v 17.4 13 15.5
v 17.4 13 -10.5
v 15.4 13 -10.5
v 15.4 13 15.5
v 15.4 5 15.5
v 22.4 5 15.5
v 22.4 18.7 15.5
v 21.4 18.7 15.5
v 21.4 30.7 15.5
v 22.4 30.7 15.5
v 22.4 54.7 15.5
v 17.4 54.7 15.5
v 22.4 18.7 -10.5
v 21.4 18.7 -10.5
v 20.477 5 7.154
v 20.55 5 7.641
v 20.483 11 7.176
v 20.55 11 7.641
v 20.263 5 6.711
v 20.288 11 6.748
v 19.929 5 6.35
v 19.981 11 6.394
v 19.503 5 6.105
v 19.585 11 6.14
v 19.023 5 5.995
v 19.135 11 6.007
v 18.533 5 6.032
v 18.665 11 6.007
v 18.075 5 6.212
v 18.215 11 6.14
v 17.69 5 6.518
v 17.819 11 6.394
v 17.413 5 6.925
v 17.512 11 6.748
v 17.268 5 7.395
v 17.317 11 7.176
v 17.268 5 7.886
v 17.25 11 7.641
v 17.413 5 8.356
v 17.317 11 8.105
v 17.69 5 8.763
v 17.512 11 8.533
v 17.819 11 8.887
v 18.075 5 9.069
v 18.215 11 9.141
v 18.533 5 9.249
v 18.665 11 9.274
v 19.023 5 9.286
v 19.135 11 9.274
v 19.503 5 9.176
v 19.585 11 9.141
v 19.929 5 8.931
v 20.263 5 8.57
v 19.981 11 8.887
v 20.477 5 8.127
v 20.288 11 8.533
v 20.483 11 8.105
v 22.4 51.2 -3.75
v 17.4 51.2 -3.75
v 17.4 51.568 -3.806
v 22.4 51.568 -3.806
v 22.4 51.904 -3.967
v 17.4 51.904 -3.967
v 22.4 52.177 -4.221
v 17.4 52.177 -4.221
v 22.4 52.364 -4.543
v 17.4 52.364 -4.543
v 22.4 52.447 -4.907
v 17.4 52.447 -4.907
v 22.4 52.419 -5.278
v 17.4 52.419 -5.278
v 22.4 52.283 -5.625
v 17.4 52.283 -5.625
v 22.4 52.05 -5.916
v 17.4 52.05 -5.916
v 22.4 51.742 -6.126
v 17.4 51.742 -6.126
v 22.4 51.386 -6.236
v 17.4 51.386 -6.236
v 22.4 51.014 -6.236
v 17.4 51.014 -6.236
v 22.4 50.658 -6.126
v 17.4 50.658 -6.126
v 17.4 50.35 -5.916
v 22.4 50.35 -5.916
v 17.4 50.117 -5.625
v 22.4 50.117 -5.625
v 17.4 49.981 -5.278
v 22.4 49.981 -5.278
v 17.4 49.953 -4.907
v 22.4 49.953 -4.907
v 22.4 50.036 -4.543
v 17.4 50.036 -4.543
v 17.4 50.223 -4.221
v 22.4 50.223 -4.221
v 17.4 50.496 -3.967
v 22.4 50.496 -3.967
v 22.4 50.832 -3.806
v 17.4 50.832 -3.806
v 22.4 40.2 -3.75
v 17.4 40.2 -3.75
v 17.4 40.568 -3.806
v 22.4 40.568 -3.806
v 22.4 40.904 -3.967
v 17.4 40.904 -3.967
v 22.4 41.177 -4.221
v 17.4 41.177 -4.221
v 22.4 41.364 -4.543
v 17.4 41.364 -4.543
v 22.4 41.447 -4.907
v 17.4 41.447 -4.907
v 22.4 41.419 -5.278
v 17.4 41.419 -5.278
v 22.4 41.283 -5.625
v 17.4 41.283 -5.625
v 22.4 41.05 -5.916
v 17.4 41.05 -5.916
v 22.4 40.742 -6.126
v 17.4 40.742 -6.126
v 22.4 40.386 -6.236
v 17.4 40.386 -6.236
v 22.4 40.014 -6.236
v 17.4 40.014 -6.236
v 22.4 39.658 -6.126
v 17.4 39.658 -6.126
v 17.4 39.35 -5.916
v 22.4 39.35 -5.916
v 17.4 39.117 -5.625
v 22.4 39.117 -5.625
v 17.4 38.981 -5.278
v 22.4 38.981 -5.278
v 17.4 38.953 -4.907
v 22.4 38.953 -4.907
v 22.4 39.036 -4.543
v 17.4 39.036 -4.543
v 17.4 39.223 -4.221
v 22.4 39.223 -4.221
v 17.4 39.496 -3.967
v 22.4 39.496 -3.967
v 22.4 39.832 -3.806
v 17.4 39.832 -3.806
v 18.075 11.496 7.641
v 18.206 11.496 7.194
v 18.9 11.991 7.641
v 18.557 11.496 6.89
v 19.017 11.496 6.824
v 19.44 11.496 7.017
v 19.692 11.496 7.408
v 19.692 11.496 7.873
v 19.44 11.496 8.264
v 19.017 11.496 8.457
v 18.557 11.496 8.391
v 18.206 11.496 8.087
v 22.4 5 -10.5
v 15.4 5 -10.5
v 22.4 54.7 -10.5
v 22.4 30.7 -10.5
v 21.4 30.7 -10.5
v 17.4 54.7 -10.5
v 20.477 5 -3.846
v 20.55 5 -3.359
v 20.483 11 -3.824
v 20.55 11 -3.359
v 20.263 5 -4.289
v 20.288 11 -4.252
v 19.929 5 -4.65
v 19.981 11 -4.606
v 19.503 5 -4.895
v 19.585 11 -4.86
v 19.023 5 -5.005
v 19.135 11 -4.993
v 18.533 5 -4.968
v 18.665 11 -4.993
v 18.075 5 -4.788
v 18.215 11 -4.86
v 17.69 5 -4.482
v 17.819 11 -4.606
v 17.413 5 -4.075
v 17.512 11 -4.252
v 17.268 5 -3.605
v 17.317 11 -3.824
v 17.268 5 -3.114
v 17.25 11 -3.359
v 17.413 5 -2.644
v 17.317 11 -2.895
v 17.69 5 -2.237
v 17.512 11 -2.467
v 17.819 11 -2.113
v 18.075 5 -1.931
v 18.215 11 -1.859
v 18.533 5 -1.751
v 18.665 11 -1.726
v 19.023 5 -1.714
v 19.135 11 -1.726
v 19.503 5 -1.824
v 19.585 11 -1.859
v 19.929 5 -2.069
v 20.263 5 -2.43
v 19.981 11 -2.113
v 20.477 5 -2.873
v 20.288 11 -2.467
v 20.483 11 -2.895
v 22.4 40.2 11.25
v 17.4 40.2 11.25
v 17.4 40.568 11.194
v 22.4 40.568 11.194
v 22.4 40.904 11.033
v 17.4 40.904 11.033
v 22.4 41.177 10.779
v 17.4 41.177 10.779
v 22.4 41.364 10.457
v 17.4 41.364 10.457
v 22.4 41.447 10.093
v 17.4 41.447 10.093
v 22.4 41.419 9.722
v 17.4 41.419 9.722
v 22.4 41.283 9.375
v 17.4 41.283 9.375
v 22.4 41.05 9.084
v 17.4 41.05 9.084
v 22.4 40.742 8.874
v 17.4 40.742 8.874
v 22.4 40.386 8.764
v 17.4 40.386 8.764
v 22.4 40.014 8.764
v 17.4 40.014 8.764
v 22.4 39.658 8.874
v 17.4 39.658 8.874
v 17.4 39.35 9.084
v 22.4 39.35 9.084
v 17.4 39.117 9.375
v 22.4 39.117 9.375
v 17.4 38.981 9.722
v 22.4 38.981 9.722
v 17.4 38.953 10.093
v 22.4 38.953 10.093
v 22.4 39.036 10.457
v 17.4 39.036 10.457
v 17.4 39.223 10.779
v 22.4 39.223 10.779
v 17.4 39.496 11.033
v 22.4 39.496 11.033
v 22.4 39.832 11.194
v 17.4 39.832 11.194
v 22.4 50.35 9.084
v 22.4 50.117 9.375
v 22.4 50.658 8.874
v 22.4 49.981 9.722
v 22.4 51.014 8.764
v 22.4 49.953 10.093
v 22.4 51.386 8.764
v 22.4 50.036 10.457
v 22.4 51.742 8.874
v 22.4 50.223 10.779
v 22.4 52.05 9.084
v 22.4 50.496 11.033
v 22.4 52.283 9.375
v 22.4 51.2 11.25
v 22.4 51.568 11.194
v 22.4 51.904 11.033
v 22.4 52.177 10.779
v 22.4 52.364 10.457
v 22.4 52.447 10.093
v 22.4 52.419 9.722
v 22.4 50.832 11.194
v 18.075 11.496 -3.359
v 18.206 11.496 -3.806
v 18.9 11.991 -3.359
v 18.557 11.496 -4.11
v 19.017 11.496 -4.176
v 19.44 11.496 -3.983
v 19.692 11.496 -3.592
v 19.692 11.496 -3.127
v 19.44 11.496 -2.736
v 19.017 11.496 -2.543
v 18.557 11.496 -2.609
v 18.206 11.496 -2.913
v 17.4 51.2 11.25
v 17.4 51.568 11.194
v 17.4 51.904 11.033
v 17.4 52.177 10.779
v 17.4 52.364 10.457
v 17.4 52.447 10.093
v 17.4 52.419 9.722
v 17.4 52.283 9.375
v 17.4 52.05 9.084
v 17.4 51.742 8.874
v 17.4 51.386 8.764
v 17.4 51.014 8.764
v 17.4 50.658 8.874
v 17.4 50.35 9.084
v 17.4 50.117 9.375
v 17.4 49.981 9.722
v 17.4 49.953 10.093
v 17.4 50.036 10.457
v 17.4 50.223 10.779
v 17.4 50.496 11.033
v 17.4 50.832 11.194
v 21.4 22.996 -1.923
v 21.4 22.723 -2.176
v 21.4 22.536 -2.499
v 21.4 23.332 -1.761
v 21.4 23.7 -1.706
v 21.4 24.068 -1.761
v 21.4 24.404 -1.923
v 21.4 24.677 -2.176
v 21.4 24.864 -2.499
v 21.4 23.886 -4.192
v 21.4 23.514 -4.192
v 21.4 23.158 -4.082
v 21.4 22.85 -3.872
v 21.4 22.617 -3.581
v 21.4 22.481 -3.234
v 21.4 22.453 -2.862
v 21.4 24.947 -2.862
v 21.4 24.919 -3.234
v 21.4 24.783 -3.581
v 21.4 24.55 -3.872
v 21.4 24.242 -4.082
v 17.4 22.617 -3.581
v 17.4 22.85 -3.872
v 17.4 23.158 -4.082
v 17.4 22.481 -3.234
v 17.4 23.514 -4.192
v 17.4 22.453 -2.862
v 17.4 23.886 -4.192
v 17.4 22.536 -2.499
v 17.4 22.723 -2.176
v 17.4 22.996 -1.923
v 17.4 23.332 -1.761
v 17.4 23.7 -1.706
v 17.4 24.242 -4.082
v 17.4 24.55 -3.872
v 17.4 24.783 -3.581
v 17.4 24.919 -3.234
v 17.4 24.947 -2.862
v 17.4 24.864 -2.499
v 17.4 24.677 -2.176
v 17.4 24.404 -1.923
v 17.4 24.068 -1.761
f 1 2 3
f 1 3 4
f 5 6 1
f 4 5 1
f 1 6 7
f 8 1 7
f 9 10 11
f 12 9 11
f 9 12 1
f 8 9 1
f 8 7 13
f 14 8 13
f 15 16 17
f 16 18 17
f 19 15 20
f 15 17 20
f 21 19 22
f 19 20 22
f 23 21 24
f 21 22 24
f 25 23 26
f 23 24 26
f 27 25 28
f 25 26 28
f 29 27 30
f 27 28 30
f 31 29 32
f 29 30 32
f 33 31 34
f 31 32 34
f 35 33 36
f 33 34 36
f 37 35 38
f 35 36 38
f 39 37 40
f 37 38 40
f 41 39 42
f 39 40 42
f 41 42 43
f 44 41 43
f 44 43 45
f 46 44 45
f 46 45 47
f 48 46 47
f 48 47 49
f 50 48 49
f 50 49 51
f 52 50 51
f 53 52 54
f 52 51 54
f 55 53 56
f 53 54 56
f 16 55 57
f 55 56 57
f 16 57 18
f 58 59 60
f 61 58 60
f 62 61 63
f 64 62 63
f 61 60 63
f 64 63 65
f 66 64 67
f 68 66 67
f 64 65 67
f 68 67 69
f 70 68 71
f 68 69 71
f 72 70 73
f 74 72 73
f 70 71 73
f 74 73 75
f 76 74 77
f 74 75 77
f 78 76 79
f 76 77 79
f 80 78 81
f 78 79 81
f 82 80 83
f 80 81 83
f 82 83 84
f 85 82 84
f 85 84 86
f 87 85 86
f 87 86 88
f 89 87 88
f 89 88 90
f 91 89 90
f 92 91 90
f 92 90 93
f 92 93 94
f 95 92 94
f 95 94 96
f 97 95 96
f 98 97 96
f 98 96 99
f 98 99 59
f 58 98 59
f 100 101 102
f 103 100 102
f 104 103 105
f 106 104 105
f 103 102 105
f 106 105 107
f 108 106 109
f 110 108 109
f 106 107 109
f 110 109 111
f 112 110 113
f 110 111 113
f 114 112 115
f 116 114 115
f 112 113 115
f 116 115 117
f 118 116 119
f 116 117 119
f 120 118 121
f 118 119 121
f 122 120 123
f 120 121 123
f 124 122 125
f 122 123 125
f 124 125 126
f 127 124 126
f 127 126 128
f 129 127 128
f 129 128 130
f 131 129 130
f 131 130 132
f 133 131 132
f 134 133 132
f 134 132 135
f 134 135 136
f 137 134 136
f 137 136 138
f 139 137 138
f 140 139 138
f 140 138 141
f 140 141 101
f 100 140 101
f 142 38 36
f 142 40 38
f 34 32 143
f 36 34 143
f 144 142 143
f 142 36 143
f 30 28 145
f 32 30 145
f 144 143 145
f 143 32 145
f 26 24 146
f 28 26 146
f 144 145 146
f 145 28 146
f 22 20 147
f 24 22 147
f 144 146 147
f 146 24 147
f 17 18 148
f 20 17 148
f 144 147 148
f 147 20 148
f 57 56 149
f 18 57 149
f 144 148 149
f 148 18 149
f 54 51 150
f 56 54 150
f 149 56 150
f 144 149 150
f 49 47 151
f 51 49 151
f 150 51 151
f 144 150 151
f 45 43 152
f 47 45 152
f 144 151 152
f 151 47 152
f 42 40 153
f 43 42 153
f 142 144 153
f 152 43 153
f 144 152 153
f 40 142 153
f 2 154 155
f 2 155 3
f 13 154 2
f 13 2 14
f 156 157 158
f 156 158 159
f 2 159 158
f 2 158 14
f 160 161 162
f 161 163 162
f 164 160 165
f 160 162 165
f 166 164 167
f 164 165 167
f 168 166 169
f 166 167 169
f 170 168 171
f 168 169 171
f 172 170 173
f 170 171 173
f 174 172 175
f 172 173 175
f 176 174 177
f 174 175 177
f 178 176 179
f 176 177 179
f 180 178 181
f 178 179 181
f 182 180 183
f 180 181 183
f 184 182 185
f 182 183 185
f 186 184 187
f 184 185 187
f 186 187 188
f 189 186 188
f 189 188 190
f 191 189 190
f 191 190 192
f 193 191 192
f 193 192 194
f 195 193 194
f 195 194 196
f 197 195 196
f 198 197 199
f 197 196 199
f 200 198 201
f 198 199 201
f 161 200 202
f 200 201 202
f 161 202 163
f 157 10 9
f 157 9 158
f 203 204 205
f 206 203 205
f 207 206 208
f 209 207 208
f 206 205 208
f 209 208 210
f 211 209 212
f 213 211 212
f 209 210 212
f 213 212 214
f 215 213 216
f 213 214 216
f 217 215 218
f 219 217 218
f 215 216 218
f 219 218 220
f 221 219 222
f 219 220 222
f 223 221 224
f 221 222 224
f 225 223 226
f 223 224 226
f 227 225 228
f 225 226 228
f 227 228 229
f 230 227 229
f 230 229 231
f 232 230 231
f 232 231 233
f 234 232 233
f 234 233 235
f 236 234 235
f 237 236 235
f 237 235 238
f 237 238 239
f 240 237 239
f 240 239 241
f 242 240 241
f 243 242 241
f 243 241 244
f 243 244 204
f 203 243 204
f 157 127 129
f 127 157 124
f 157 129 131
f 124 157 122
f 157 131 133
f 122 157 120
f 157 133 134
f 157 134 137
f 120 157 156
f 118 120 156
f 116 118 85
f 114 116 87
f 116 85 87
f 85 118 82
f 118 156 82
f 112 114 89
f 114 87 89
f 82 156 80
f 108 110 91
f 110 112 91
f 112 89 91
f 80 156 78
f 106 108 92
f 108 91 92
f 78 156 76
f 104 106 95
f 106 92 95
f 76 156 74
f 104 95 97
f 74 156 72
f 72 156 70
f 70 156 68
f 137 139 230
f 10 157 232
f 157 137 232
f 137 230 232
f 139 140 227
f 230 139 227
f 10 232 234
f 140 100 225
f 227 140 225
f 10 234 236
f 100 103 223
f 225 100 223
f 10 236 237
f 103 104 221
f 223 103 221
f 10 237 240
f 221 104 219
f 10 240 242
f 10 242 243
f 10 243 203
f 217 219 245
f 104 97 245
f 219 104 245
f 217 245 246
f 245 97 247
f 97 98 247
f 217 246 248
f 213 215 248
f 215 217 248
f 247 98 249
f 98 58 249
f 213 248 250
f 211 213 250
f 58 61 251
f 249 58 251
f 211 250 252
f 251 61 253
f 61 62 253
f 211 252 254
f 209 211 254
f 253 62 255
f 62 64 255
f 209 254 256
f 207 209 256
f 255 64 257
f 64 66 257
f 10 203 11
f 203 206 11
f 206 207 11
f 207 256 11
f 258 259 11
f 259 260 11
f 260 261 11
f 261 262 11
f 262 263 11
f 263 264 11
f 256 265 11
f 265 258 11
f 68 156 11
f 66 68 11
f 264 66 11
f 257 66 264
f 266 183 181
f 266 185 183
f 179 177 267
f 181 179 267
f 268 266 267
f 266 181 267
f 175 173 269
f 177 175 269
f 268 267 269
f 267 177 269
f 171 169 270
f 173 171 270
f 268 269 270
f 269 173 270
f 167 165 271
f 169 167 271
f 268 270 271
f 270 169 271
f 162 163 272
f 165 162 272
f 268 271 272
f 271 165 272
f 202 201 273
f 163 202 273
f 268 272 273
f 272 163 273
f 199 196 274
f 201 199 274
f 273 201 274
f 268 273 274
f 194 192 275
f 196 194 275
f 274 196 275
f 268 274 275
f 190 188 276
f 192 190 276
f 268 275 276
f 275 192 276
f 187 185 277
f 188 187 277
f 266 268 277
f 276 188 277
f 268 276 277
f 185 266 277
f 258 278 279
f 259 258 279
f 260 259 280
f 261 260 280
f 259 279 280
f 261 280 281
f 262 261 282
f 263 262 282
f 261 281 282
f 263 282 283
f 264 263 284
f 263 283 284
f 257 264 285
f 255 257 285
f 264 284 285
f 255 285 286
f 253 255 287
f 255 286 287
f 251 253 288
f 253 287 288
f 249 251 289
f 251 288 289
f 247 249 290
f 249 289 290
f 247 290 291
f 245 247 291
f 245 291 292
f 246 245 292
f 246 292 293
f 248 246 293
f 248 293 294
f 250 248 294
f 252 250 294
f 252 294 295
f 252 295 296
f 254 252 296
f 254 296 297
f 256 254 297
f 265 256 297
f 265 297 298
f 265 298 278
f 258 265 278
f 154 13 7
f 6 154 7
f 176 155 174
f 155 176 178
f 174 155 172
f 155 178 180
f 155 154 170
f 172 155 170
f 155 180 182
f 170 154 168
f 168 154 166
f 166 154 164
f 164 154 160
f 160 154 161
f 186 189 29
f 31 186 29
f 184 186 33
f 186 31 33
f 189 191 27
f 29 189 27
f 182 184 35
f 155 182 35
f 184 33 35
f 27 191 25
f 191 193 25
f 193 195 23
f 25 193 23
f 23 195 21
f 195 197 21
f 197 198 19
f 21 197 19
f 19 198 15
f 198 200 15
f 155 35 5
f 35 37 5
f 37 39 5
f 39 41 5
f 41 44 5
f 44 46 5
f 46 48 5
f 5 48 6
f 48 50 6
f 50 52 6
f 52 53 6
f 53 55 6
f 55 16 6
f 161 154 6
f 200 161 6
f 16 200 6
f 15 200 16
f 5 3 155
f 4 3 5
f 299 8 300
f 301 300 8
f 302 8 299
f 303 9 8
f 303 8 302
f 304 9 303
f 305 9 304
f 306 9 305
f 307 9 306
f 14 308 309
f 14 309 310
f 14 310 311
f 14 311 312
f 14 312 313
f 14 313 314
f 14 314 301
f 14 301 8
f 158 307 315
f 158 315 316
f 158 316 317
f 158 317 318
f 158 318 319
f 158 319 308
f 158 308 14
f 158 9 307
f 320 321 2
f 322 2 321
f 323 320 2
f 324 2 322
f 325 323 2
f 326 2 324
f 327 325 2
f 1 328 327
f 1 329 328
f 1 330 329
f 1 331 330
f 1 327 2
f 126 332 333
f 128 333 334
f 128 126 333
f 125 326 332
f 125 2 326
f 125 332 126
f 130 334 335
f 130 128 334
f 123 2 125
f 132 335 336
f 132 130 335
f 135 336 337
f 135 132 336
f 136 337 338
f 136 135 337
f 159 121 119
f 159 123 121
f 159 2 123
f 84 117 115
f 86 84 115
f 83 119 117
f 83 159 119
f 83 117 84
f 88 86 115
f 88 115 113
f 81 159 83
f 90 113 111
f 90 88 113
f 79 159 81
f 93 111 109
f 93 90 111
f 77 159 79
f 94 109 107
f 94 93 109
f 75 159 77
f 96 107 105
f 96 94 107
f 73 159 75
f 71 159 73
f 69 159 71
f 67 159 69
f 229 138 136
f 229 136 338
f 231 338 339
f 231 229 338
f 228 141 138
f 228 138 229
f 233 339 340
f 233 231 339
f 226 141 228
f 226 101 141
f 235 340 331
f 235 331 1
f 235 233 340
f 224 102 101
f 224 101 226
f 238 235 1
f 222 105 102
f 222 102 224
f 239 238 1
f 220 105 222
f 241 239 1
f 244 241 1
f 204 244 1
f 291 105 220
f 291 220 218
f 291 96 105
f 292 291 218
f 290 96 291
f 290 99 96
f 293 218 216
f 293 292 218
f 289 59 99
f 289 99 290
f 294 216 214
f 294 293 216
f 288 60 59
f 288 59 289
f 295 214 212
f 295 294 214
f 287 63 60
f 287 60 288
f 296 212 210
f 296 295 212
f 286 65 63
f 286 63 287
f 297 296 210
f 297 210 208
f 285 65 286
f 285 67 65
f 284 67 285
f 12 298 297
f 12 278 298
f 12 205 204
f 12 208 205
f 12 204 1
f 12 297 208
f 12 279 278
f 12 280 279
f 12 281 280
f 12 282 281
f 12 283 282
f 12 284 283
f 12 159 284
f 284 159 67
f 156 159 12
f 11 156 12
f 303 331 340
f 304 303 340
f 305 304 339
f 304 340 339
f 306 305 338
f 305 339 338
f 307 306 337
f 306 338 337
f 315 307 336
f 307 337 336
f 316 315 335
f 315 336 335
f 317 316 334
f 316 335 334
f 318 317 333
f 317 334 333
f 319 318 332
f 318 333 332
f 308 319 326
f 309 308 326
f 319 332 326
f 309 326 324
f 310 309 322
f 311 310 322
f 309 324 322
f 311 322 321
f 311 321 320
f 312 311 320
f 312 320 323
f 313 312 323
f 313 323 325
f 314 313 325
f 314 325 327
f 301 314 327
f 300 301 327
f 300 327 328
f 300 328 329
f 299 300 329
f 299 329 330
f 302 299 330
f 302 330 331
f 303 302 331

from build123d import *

# Parameters (mm, degrees)
SKETCH_1_W             = 30
SKETCH_1_H             = 6
EXTRUDE_1_DEPTH        = 5
SKETCH_2_R             = 2.25
CUT_EXTRUDE_1_DEPTH    = 6
SKETCH_3_W             = 40
SKETCH_3_H             = 30
EXTRUDE_2_DEPTH        = 5
SKETCH_4_W             = 3
SKETCH_4_H             = 20
CUT_EXTRUDE_2_DEPTH    = 10
SKETCH_7_W             = 10
SKETCH_7_H             = 5
CUT_EXTRUDE_3_DEPTH    = 31
SKETCH_9_W             = 5
SKETCH_9_H             = 5
EXTRUDE_5_DEPTH        = 18
SKETCH_10_W            = 10
SKETCH_10_H            = 20
CUT_EXTRUDE_4_DEPTH    = 18
SKETCH_11_W            = 17
SKETCH_11_H            = 5
EXTRUDE_6_DEPTH        = 0.7
SKETCH_12_W            = 5
SKETCH_12_H            = 5
EXTRUDE_7_DEPTH        = 0.7
SKETCH_13_W            = 26
SKETCH_13_H            = 18
EXTRUDE_8_DEPTH        = 5
HOLE_WIZARD_M3_1_D     = 2.5
HOLE_WIZARD_M3_1_DEPTH = 7.5
HOLE_WIZARD_M3_1_TIP   = 0.751075774
SKETCH_16_W            = 14.26711197
SKETCH_16_H            = 39.299316136
CUT_EXTRUDE_5_DEPTH    = 31
SKETCH_17_W            = 5
SKETCH_17_H            = 26
EXTRUDE_9_DEPTH        = 30.7
SKETCH_18_W            = 5
SKETCH_18_H            = 26
EXTRUDE_10_DEPTH       = 1
SKETCH_20_W            = 26
SKETCH_20_H            = 8
EXTRUDE_11_DEPTH       = 2
HOLE_WIZARD_M4_1_D     = 3.3
HOLE_WIZARD_M4_1_DEPTH = 6
HOLE_WIZARD_M4_1_TIP   = 0.991420021
SKETCH_23_W            = 26
SKETCH_23_H            = 12
CUT_EXTRUDE_6_DEPTH    = 1
HOLE_WIZARD_M3_2_D     = 2.5
HOLE_WIZARD_M3_2_DEPTH = 7.5
HOLE_WIZARD_M3_2_TIP   = 0.751075774


with BuildPart() as part:
    # 草图1 → 凸台-拉伸1 (new body)
    with BuildSketch(Plane.XY):
        with Locations((15, 3)):
            Rectangle(SKETCH_1_W, SKETCH_1_H)
    extrude(amount=EXTRUDE_1_DEPTH)

    # 草图2 → 切除-拉伸1 (cut, through all)
    with BuildSketch(Plane.XY.offset(5)):
        with Locations((22.5, 3)):
            Circle(SKETCH_2_R)
        with Locations((7.5, 3)):
            Circle(SKETCH_2_R)
    extrude(amount=-CUT_EXTRUDE_1_DEPTH, mode=Mode.SUBTRACT)

    # 草图3 → 凸台-拉伸2 (add)
    with BuildSketch(Plane.XY.offset(5)):
        with Locations((10, 21)):
            Rectangle(SKETCH_3_W, SKETCH_3_H)
    extrude(amount=-EXTRUDE_2_DEPTH)

    # 草图4 → 切除-拉伸2 (cut)
    with BuildSketch(Plane.XY.offset(5)):
        with Locations((28.5, 26)):
            Rectangle(SKETCH_4_W, SKETCH_4_H)
    extrude(amount=-CUT_EXTRUDE_2_DEPTH, mode=Mode.SUBTRACT)

    # 草图7 → 切除-拉伸3 (cut, through all)
    with BuildSketch(Plane.XZ.offset(-6)):
        with Locations((-5, 2.5)):
            Rectangle(SKETCH_7_W, SKETCH_7_H)
    extrude(amount=-CUT_EXTRUDE_3_DEPTH, mode=Mode.SUBTRACT)

    # 草图9 → 凸台-拉伸5 (add)
    with BuildSketch(Plane(origin=(0, 36, 0), x_dir=(1, 0, 0), z_dir=(0, 1, 0))):
        with Locations((19.9, -2.5)):
            Rectangle(SKETCH_9_W, SKETCH_9_H)
    extrude(amount=EXTRUDE_5_DEPTH)

    # 草图10 → 切除-拉伸4 (cut)
    with BuildSketch(Plane.XY.offset(5)):
        with Locations((5, 26)):
            Rectangle(SKETCH_10_W, SKETCH_10_H)
    extrude(amount=-CUT_EXTRUDE_4_DEPTH, mode=Mode.SUBTRACT)

    # 草图11 → 凸台-拉伸6 (add)
    with BuildSketch(Plane(origin=(0, 36, 0), x_dir=(1, 0, 0), z_dir=(0, 1, 0))):
        with Locations((18.5, -2.5)):
            Rectangle(SKETCH_11_W, SKETCH_11_H)
    extrude(amount=EXTRUDE_6_DEPTH)

    # 草图12 → 凸台-拉伸7 (add)
    with BuildSketch(Plane(origin=(0, 54, 0), x_dir=(1, 0, 0), z_dir=(0, 1, 0))):
        with Locations((19.9, -2.5)):
            Rectangle(SKETCH_12_W, SKETCH_12_H)
    extrude(amount=EXTRUDE_7_DEPTH)

    # 草图13 → 凸台-拉伸8 (add)
    with BuildSketch(Plane.ZY.offset(-17.4)):
        with Locations((2.5, 45.7)):
            Rectangle(SKETCH_13_W, SKETCH_13_H)
    extrude(amount=-EXTRUDE_8_DEPTH)

    # M3 螺纹孔1
    with Locations(Plane(origin=(22.4, 0, 0), x_dir=(0, 0, -1), z_dir=(1, 0, 0))):
        with Locations((-10, 40.2), (5, 40.2), (5, 51.2), (-10, 51.2)):
            Hole(HOLE_WIZARD_M3_1_D / 2, depth=HOLE_WIZARD_M3_1_DEPTH)
            with Locations((0, 0, -(HOLE_WIZARD_M3_1_DEPTH + HOLE_WIZARD_M3_1_TIP / 2))):  # 118° drill point
                Cone(0, HOLE_WIZARD_M3_1_D / 2, HOLE_WIZARD_M3_1_TIP, mode=Mode.SUBTRACT)

    # 草图16 → 切除-拉伸5 (cut, through all)
    with BuildSketch(Plane(origin=(30, 0, 0), x_dir=(0, 0, -1), z_dir=(1, 0, 0))):
        with Locations((-7.133555985, 17.050341932)):
            Rectangle(SKETCH_16_W, SKETCH_16_H)
    extrude(amount=-CUT_EXTRUDE_5_DEPTH, mode=Mode.SUBTRACT)

    # 草图17 → 凸台-拉伸9 (add)
    with BuildSketch(Plane.XZ.offset(-36.7)):
        with Locations((19.9, 2.5)):
            Rectangle(SKETCH_17_W, SKETCH_17_H)
    extrude(amount=EXTRUDE_9_DEPTH)

    # 草图18 → 凸台-拉伸10 (add)
    with BuildSketch(Plane.XZ.offset(-6)):
        with Locations((19.9, 2.5)):
            Rectangle(SKETCH_18_W, SKETCH_18_H)
    extrude(amount=EXTRUDE_10_DEPTH)

    # 草图20 → 凸台-拉伸11 (add)
    with BuildSketch(Plane.ZY.offset(-17.4)):
        with Locations((2.5, 9)):
            Rectangle(SKETCH_20_W, SKETCH_20_H)
    extrude(amount=EXTRUDE_11_DEPTH)

    # M4 螺纹孔1
    with Locations(Plane(origin=(0, 5, 0), x_dir=(-1, 0, 0), z_dir=(0, -1, 0))):
        with Locations((-18.9, -7.640506964), (-18.9, 3.359493036)):
            Hole(HOLE_WIZARD_M4_1_D / 2, depth=HOLE_WIZARD_M4_1_DEPTH)
            with Locations((0, 0, -(HOLE_WIZARD_M4_1_DEPTH + HOLE_WIZARD_M4_1_TIP / 2))):  # 118° drill point
                Cone(0, HOLE_WIZARD_M4_1_D / 2, HOLE_WIZARD_M4_1_TIP, mode=Mode.SUBTRACT)

    # 草图23 → 切除-拉伸6 (cut)
    with BuildSketch(Plane(origin=(22.4, 0, 0), x_dir=(0, 0, -1), z_dir=(1, 0, 0))):
        with Locations((-2.5, 24.7)):
            Rectangle(SKETCH_23_W, SKETCH_23_H)
    extrude(amount=-CUT_EXTRUDE_6_DEPTH, mode=Mode.SUBTRACT)

    # M3 螺纹孔2
    with Locations(Plane(origin=(21.4, 0, 0), x_dir=(0, 0, -1), z_dir=(1, 0, 0))):
        with Locations((2.955672884, 23.7)):
            Hole(HOLE_WIZARD_M3_2_D / 2, depth=HOLE_WIZARD_M3_2_DEPTH)
            with Locations((0, 0, -(HOLE_WIZARD_M3_2_DEPTH + HOLE_WIZARD_M3_2_TIP / 2))):  # 118° drill point
                Cone(0, HOLE_WIZARD_M3_2_D / 2, HOLE_WIZARD_M3_2_TIP, mode=Mode.SUBTRACT)


solid = part.part
